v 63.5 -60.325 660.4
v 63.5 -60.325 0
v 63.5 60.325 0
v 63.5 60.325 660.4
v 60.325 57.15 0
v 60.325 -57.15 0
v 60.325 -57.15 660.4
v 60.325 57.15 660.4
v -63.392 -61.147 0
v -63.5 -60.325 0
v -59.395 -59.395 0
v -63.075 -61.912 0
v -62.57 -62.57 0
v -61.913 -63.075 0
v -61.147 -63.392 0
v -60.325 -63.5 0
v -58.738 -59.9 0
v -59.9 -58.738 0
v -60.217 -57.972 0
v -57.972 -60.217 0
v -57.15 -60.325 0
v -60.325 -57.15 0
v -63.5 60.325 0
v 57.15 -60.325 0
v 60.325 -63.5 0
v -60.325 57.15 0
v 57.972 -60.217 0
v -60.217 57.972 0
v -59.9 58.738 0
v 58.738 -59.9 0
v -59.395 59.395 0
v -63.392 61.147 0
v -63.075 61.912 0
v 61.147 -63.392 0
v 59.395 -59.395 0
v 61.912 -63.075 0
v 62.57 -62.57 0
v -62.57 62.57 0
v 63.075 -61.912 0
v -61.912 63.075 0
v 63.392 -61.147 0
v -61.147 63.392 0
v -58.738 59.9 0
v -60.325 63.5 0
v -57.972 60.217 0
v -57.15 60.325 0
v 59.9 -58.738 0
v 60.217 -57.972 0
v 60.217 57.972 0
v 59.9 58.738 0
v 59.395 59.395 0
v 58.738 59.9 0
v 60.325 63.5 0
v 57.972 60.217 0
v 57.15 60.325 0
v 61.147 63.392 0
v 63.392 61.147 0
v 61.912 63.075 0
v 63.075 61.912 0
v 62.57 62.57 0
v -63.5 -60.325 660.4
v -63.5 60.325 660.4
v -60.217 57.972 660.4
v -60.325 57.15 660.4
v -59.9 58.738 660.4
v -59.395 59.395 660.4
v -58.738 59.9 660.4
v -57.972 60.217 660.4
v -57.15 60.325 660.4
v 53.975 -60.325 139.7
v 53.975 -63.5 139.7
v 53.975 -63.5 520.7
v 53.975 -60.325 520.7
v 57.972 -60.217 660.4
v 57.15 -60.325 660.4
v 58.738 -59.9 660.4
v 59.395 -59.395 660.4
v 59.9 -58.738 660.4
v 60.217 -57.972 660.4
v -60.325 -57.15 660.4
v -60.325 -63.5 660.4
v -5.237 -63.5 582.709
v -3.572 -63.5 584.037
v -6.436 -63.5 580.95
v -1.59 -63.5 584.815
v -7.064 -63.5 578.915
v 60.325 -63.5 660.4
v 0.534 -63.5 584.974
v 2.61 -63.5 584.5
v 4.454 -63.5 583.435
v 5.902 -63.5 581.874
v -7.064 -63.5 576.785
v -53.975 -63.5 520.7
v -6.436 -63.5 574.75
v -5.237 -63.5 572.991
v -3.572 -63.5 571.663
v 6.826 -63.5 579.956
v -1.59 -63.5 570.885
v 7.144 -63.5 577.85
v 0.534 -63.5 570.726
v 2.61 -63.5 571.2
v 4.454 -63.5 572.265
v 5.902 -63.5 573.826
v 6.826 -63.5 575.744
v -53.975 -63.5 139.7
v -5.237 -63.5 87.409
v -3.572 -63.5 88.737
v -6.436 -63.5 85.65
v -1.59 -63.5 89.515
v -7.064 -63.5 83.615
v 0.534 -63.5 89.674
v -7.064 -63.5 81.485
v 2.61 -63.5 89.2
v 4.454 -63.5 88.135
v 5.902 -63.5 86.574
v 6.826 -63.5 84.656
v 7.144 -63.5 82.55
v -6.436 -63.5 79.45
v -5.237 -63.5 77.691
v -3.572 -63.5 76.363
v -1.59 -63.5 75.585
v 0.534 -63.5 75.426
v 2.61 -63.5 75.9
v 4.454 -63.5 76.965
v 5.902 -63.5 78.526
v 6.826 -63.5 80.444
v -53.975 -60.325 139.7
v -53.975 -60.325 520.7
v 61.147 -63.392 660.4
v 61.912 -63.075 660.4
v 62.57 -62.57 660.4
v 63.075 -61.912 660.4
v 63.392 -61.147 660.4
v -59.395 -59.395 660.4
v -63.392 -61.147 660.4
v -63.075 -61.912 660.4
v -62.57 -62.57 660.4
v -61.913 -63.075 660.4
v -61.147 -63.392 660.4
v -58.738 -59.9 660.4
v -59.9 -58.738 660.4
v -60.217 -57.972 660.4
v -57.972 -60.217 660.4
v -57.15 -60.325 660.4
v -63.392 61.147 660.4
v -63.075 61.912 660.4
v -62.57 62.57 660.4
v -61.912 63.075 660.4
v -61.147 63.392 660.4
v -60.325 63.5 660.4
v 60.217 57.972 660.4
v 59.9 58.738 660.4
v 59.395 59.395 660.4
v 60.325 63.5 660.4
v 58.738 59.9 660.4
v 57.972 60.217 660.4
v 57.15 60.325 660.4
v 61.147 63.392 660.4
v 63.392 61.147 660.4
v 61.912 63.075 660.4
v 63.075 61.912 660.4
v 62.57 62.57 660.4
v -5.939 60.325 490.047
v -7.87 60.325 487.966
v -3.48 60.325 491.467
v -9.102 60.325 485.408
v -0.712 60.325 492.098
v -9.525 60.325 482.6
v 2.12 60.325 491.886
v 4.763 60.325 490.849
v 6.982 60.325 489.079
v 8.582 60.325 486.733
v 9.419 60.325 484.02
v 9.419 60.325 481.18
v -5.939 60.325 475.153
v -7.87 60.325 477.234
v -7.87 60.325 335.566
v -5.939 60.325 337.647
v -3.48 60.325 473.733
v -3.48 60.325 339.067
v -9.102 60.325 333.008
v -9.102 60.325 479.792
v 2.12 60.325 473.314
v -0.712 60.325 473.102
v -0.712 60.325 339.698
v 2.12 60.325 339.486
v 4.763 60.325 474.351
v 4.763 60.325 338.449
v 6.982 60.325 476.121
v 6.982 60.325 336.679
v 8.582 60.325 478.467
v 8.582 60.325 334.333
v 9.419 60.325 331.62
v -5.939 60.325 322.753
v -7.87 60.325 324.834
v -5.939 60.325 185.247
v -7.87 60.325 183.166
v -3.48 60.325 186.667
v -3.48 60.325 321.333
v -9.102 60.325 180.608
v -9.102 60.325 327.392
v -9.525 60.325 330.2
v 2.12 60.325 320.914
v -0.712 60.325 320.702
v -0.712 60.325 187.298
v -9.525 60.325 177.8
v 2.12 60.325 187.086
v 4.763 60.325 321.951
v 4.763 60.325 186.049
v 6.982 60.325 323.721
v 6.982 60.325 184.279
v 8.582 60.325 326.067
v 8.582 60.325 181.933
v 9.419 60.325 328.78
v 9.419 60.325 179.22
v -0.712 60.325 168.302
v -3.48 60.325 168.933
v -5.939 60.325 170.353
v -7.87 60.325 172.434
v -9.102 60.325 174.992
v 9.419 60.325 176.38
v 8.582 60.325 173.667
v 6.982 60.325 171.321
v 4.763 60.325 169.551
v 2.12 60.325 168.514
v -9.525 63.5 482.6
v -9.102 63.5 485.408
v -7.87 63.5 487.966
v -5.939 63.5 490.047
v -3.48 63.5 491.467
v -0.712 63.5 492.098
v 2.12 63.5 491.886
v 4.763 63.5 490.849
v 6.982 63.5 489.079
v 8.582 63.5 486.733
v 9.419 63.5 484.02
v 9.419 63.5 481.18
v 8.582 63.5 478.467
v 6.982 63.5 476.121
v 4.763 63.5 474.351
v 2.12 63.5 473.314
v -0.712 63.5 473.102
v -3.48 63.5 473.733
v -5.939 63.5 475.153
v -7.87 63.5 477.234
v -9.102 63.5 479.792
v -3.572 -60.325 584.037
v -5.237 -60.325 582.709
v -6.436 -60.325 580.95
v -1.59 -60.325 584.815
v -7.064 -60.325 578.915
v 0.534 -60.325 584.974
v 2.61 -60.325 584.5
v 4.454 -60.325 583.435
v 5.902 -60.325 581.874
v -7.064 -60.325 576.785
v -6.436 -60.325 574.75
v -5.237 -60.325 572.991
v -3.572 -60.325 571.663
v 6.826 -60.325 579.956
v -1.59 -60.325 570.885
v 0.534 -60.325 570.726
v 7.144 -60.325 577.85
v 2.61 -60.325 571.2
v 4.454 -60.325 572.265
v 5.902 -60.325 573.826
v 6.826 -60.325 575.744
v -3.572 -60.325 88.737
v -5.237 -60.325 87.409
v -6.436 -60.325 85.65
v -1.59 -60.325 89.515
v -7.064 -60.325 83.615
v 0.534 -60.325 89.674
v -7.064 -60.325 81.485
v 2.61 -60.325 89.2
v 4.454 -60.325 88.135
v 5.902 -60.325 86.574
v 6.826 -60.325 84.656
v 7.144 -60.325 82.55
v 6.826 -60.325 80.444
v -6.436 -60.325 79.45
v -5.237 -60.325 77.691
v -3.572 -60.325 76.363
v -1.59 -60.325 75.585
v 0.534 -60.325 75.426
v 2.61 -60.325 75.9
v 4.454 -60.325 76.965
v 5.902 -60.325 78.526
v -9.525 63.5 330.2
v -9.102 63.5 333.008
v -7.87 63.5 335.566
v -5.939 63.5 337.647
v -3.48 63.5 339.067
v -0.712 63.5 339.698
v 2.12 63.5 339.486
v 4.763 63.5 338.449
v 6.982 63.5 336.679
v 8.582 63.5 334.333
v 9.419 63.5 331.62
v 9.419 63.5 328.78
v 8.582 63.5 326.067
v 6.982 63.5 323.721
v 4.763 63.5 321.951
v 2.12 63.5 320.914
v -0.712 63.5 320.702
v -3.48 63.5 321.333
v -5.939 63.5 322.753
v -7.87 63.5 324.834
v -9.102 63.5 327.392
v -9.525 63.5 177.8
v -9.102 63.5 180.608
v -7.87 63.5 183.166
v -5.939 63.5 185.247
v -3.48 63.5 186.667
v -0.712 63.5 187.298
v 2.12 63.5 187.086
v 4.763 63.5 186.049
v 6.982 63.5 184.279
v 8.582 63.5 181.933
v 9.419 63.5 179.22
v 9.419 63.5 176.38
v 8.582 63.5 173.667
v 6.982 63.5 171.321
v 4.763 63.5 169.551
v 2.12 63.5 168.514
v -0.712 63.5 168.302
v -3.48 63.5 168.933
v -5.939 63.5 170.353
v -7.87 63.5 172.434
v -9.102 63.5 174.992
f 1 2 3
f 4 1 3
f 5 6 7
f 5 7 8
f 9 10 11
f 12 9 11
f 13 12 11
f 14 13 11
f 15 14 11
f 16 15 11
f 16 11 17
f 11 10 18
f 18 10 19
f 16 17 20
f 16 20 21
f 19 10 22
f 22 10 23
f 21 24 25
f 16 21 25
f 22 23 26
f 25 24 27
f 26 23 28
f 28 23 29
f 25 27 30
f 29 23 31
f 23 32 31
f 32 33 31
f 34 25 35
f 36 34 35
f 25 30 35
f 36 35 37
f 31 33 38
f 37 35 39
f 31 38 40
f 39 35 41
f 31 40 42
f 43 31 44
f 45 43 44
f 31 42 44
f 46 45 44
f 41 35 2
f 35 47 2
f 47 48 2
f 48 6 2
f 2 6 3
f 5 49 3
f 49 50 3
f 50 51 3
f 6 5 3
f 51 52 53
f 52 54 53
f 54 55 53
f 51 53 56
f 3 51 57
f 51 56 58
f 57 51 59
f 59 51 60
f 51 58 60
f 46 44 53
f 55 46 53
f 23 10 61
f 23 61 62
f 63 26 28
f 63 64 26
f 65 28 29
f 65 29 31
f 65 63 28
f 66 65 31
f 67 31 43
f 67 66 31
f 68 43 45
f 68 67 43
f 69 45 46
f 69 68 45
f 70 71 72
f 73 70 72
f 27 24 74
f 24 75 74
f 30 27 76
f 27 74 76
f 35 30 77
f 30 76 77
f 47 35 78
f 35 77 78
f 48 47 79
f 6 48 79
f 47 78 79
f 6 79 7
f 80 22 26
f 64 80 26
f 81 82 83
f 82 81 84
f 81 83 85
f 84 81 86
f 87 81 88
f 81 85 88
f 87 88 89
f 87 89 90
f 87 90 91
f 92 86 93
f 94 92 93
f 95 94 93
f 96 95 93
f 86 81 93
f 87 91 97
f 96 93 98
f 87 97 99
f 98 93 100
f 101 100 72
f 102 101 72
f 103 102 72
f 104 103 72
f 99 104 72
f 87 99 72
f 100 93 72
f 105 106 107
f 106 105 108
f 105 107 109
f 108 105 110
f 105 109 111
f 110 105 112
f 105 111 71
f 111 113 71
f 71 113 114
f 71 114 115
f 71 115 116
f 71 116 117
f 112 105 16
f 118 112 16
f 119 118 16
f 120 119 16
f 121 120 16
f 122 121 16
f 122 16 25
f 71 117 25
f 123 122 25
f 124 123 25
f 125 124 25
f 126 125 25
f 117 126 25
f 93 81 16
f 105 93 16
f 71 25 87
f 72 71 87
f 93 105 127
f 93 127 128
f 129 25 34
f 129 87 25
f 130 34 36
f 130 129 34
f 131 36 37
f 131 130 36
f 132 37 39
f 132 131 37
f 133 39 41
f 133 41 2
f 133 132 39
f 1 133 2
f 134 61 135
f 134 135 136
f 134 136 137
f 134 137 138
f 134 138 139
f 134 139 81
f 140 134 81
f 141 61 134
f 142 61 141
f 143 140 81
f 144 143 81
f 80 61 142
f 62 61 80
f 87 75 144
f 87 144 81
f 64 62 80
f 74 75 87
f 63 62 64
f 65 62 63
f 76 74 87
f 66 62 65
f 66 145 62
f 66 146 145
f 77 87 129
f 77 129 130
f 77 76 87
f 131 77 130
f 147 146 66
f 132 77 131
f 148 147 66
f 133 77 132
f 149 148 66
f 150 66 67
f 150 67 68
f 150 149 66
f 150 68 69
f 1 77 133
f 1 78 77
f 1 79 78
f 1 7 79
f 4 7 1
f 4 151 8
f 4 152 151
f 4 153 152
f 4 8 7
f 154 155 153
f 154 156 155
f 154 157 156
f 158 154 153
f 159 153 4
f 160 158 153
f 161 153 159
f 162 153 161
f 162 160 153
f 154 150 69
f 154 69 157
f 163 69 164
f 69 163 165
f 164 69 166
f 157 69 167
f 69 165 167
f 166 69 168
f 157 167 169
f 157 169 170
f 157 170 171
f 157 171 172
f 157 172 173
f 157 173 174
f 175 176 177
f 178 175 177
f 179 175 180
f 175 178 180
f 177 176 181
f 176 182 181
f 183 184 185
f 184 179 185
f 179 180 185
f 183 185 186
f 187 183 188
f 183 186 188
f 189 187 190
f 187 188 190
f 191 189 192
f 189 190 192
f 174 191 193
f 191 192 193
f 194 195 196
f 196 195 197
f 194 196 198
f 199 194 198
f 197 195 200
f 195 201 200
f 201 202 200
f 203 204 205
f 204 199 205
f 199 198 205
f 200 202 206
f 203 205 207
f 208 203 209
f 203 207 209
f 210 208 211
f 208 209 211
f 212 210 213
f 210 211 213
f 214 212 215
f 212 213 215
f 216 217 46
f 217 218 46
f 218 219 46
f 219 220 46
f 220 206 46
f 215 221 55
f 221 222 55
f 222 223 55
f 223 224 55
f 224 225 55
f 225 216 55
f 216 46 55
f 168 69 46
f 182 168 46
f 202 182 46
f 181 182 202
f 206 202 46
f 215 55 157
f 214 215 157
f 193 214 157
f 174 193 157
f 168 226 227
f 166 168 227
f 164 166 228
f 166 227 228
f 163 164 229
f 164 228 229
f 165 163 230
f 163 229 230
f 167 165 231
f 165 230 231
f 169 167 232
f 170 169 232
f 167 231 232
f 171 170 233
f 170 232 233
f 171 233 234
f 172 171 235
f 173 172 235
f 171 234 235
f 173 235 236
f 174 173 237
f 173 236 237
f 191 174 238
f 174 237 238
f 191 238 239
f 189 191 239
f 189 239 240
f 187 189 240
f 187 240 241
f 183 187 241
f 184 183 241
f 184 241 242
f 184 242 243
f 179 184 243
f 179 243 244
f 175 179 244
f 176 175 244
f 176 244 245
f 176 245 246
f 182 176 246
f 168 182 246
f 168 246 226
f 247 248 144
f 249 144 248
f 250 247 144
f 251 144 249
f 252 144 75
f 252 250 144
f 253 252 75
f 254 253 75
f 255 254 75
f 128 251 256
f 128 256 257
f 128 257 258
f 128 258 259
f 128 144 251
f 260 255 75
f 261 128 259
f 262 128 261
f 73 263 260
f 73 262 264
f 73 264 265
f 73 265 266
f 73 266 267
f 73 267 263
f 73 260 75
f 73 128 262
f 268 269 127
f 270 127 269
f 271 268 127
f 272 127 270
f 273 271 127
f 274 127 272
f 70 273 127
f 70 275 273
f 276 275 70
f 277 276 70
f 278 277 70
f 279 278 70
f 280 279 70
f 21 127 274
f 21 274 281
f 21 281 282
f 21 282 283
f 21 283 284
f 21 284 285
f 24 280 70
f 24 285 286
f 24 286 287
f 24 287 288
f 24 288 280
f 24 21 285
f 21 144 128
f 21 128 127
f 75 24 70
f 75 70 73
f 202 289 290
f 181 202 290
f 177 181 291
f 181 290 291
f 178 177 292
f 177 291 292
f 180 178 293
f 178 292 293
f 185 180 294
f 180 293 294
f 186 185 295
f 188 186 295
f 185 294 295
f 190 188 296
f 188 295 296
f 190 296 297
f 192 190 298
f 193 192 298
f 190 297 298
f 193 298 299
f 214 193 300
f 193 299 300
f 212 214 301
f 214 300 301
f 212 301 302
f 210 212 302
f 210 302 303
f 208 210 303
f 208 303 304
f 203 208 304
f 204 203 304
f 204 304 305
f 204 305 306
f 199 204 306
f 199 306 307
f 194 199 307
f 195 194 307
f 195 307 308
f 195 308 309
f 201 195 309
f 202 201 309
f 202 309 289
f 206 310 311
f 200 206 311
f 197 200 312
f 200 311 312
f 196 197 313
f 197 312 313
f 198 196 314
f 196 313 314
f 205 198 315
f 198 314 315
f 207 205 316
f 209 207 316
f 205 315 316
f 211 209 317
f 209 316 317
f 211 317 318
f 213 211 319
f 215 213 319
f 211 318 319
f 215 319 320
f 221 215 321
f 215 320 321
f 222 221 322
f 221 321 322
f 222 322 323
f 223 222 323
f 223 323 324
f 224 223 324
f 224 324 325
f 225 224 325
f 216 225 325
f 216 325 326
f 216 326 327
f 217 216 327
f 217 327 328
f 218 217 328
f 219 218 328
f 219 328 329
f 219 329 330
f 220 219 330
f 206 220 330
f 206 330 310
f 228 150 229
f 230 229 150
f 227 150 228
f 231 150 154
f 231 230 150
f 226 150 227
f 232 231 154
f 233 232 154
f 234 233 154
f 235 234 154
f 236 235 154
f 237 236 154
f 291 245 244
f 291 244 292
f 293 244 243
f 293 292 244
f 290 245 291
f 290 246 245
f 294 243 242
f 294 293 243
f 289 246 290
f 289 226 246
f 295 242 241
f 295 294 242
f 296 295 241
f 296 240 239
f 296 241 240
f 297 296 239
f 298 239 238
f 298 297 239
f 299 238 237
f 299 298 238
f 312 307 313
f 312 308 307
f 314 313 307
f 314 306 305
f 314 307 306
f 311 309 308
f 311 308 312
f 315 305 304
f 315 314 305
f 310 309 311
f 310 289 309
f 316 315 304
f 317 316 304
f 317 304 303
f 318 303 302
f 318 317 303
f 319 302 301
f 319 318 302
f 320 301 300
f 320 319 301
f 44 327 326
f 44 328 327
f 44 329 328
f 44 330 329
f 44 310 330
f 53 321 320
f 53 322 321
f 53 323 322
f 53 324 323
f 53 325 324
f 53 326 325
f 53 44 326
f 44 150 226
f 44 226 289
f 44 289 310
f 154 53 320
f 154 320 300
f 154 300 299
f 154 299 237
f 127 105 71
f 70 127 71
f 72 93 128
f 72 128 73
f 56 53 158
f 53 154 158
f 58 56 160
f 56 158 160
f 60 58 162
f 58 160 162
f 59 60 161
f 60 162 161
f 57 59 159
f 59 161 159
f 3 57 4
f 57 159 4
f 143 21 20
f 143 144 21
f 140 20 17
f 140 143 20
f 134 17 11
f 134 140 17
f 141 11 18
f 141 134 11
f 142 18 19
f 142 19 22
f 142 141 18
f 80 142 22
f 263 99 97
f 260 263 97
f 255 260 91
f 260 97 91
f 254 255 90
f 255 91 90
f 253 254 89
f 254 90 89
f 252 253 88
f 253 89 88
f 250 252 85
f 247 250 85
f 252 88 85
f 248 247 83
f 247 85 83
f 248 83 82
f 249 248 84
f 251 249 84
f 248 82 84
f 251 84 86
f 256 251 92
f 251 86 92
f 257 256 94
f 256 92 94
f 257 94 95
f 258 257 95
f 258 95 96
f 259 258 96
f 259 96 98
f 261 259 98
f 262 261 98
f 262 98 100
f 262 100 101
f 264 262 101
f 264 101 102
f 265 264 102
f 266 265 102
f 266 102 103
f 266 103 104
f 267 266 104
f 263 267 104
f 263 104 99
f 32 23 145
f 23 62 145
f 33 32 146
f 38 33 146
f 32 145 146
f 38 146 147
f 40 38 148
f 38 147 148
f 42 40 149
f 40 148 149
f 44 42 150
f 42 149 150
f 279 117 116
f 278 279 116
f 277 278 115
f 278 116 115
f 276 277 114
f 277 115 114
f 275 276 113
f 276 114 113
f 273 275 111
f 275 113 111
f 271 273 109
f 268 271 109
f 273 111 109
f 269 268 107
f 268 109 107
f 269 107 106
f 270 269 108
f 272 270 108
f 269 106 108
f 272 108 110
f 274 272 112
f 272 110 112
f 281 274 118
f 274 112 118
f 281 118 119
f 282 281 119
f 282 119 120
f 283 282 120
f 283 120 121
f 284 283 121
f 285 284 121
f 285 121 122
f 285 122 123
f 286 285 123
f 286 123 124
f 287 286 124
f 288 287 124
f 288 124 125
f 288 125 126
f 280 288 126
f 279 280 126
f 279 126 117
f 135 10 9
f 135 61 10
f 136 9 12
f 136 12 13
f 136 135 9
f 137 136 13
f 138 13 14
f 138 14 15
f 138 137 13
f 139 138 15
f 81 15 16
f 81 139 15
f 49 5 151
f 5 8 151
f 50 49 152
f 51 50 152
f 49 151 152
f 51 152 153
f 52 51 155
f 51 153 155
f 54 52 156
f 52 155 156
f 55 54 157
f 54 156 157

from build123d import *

# Parameters (mm, degrees)
F0_W     = 127
F0_H     = 127
F0_W_2   = 120.65
F0_H_2   = 120.65
F1_DEPTH = 660.4
F2_R     = 3.175
F3_R     = 3.175
F4_W     = 107.95
F4_H     = 381
F5_DEPTH = 25.4
F6_R     = 7.14375
F7_DEPTH = 25.4
F8_R     = 9.525
F9_DEPTH = 25.4


with BuildPart() as f1:
    # F0 (on Top) → F1 (new body)
    with BuildSketch(Plane.XY):
        Rectangle(F0_W, F0_H)
        Rectangle(F0_W_2, F0_H_2, mode=Mode.SUBTRACT)
    extrude(amount=F1_DEPTH)

    # F2
    f2_edges = [f1.edges().sort_by_distance(p)[0] for p in [
        (60.325, 60.325, 330.2),
        (63.5, -63.5, 330.2),
        (-63.5, -63.5, 330.2),
        (-63.5, 63.5, 330.2),
        (60.325, -60.325, 330.2),
        (63.5, 63.5, 330.2),
        (-60.325, -60.325, 330.2),
    ]]
    fillet(f2_edges, radius=F2_R)

    # F3
    f3_edges = [f1.edges().sort_by_distance(p)[0] for p in [
        (-60.325, 60.325, 330.2),
    ]]
    fillet(f3_edges, radius=F3_R)

    # F4 (on face) → F5 (cut)
    with BuildSketch(Plane.XZ.offset(63.5)):
        with Locations((0, 330.2)):
            Rectangle(F4_W, F4_H)
    extrude(amount=-F5_DEPTH, mode=Mode.SUBTRACT)

    # F6 (on face) → F7 (cut)
    with BuildSketch(Plane.XZ.offset(63.5)):
        with Locations((0, 82.55)):
            Circle(F6_R)
        with Locations((0, 577.85)):
            Circle(F6_R)
    extrude(amount=-F7_DEPTH, mode=Mode.SUBTRACT)

    # F8 (on face) → F9 (cut)
    with BuildSketch(Plane(origin=(0, 63.5, 0), x_dir=(-1, 0, 0), z_dir=(0, 1, 0))):
        with Locations((0, 177.8)):
            Circle(F8_R)
        with Locations((0, 330.2)):
            Circle(F8_R)
        with Locations((0, 482.6)):
            Circle(F8_R)
    extrude(amount=-F9_DEPTH, mode=Mode.SUBTRACT)


solid = f1.part
